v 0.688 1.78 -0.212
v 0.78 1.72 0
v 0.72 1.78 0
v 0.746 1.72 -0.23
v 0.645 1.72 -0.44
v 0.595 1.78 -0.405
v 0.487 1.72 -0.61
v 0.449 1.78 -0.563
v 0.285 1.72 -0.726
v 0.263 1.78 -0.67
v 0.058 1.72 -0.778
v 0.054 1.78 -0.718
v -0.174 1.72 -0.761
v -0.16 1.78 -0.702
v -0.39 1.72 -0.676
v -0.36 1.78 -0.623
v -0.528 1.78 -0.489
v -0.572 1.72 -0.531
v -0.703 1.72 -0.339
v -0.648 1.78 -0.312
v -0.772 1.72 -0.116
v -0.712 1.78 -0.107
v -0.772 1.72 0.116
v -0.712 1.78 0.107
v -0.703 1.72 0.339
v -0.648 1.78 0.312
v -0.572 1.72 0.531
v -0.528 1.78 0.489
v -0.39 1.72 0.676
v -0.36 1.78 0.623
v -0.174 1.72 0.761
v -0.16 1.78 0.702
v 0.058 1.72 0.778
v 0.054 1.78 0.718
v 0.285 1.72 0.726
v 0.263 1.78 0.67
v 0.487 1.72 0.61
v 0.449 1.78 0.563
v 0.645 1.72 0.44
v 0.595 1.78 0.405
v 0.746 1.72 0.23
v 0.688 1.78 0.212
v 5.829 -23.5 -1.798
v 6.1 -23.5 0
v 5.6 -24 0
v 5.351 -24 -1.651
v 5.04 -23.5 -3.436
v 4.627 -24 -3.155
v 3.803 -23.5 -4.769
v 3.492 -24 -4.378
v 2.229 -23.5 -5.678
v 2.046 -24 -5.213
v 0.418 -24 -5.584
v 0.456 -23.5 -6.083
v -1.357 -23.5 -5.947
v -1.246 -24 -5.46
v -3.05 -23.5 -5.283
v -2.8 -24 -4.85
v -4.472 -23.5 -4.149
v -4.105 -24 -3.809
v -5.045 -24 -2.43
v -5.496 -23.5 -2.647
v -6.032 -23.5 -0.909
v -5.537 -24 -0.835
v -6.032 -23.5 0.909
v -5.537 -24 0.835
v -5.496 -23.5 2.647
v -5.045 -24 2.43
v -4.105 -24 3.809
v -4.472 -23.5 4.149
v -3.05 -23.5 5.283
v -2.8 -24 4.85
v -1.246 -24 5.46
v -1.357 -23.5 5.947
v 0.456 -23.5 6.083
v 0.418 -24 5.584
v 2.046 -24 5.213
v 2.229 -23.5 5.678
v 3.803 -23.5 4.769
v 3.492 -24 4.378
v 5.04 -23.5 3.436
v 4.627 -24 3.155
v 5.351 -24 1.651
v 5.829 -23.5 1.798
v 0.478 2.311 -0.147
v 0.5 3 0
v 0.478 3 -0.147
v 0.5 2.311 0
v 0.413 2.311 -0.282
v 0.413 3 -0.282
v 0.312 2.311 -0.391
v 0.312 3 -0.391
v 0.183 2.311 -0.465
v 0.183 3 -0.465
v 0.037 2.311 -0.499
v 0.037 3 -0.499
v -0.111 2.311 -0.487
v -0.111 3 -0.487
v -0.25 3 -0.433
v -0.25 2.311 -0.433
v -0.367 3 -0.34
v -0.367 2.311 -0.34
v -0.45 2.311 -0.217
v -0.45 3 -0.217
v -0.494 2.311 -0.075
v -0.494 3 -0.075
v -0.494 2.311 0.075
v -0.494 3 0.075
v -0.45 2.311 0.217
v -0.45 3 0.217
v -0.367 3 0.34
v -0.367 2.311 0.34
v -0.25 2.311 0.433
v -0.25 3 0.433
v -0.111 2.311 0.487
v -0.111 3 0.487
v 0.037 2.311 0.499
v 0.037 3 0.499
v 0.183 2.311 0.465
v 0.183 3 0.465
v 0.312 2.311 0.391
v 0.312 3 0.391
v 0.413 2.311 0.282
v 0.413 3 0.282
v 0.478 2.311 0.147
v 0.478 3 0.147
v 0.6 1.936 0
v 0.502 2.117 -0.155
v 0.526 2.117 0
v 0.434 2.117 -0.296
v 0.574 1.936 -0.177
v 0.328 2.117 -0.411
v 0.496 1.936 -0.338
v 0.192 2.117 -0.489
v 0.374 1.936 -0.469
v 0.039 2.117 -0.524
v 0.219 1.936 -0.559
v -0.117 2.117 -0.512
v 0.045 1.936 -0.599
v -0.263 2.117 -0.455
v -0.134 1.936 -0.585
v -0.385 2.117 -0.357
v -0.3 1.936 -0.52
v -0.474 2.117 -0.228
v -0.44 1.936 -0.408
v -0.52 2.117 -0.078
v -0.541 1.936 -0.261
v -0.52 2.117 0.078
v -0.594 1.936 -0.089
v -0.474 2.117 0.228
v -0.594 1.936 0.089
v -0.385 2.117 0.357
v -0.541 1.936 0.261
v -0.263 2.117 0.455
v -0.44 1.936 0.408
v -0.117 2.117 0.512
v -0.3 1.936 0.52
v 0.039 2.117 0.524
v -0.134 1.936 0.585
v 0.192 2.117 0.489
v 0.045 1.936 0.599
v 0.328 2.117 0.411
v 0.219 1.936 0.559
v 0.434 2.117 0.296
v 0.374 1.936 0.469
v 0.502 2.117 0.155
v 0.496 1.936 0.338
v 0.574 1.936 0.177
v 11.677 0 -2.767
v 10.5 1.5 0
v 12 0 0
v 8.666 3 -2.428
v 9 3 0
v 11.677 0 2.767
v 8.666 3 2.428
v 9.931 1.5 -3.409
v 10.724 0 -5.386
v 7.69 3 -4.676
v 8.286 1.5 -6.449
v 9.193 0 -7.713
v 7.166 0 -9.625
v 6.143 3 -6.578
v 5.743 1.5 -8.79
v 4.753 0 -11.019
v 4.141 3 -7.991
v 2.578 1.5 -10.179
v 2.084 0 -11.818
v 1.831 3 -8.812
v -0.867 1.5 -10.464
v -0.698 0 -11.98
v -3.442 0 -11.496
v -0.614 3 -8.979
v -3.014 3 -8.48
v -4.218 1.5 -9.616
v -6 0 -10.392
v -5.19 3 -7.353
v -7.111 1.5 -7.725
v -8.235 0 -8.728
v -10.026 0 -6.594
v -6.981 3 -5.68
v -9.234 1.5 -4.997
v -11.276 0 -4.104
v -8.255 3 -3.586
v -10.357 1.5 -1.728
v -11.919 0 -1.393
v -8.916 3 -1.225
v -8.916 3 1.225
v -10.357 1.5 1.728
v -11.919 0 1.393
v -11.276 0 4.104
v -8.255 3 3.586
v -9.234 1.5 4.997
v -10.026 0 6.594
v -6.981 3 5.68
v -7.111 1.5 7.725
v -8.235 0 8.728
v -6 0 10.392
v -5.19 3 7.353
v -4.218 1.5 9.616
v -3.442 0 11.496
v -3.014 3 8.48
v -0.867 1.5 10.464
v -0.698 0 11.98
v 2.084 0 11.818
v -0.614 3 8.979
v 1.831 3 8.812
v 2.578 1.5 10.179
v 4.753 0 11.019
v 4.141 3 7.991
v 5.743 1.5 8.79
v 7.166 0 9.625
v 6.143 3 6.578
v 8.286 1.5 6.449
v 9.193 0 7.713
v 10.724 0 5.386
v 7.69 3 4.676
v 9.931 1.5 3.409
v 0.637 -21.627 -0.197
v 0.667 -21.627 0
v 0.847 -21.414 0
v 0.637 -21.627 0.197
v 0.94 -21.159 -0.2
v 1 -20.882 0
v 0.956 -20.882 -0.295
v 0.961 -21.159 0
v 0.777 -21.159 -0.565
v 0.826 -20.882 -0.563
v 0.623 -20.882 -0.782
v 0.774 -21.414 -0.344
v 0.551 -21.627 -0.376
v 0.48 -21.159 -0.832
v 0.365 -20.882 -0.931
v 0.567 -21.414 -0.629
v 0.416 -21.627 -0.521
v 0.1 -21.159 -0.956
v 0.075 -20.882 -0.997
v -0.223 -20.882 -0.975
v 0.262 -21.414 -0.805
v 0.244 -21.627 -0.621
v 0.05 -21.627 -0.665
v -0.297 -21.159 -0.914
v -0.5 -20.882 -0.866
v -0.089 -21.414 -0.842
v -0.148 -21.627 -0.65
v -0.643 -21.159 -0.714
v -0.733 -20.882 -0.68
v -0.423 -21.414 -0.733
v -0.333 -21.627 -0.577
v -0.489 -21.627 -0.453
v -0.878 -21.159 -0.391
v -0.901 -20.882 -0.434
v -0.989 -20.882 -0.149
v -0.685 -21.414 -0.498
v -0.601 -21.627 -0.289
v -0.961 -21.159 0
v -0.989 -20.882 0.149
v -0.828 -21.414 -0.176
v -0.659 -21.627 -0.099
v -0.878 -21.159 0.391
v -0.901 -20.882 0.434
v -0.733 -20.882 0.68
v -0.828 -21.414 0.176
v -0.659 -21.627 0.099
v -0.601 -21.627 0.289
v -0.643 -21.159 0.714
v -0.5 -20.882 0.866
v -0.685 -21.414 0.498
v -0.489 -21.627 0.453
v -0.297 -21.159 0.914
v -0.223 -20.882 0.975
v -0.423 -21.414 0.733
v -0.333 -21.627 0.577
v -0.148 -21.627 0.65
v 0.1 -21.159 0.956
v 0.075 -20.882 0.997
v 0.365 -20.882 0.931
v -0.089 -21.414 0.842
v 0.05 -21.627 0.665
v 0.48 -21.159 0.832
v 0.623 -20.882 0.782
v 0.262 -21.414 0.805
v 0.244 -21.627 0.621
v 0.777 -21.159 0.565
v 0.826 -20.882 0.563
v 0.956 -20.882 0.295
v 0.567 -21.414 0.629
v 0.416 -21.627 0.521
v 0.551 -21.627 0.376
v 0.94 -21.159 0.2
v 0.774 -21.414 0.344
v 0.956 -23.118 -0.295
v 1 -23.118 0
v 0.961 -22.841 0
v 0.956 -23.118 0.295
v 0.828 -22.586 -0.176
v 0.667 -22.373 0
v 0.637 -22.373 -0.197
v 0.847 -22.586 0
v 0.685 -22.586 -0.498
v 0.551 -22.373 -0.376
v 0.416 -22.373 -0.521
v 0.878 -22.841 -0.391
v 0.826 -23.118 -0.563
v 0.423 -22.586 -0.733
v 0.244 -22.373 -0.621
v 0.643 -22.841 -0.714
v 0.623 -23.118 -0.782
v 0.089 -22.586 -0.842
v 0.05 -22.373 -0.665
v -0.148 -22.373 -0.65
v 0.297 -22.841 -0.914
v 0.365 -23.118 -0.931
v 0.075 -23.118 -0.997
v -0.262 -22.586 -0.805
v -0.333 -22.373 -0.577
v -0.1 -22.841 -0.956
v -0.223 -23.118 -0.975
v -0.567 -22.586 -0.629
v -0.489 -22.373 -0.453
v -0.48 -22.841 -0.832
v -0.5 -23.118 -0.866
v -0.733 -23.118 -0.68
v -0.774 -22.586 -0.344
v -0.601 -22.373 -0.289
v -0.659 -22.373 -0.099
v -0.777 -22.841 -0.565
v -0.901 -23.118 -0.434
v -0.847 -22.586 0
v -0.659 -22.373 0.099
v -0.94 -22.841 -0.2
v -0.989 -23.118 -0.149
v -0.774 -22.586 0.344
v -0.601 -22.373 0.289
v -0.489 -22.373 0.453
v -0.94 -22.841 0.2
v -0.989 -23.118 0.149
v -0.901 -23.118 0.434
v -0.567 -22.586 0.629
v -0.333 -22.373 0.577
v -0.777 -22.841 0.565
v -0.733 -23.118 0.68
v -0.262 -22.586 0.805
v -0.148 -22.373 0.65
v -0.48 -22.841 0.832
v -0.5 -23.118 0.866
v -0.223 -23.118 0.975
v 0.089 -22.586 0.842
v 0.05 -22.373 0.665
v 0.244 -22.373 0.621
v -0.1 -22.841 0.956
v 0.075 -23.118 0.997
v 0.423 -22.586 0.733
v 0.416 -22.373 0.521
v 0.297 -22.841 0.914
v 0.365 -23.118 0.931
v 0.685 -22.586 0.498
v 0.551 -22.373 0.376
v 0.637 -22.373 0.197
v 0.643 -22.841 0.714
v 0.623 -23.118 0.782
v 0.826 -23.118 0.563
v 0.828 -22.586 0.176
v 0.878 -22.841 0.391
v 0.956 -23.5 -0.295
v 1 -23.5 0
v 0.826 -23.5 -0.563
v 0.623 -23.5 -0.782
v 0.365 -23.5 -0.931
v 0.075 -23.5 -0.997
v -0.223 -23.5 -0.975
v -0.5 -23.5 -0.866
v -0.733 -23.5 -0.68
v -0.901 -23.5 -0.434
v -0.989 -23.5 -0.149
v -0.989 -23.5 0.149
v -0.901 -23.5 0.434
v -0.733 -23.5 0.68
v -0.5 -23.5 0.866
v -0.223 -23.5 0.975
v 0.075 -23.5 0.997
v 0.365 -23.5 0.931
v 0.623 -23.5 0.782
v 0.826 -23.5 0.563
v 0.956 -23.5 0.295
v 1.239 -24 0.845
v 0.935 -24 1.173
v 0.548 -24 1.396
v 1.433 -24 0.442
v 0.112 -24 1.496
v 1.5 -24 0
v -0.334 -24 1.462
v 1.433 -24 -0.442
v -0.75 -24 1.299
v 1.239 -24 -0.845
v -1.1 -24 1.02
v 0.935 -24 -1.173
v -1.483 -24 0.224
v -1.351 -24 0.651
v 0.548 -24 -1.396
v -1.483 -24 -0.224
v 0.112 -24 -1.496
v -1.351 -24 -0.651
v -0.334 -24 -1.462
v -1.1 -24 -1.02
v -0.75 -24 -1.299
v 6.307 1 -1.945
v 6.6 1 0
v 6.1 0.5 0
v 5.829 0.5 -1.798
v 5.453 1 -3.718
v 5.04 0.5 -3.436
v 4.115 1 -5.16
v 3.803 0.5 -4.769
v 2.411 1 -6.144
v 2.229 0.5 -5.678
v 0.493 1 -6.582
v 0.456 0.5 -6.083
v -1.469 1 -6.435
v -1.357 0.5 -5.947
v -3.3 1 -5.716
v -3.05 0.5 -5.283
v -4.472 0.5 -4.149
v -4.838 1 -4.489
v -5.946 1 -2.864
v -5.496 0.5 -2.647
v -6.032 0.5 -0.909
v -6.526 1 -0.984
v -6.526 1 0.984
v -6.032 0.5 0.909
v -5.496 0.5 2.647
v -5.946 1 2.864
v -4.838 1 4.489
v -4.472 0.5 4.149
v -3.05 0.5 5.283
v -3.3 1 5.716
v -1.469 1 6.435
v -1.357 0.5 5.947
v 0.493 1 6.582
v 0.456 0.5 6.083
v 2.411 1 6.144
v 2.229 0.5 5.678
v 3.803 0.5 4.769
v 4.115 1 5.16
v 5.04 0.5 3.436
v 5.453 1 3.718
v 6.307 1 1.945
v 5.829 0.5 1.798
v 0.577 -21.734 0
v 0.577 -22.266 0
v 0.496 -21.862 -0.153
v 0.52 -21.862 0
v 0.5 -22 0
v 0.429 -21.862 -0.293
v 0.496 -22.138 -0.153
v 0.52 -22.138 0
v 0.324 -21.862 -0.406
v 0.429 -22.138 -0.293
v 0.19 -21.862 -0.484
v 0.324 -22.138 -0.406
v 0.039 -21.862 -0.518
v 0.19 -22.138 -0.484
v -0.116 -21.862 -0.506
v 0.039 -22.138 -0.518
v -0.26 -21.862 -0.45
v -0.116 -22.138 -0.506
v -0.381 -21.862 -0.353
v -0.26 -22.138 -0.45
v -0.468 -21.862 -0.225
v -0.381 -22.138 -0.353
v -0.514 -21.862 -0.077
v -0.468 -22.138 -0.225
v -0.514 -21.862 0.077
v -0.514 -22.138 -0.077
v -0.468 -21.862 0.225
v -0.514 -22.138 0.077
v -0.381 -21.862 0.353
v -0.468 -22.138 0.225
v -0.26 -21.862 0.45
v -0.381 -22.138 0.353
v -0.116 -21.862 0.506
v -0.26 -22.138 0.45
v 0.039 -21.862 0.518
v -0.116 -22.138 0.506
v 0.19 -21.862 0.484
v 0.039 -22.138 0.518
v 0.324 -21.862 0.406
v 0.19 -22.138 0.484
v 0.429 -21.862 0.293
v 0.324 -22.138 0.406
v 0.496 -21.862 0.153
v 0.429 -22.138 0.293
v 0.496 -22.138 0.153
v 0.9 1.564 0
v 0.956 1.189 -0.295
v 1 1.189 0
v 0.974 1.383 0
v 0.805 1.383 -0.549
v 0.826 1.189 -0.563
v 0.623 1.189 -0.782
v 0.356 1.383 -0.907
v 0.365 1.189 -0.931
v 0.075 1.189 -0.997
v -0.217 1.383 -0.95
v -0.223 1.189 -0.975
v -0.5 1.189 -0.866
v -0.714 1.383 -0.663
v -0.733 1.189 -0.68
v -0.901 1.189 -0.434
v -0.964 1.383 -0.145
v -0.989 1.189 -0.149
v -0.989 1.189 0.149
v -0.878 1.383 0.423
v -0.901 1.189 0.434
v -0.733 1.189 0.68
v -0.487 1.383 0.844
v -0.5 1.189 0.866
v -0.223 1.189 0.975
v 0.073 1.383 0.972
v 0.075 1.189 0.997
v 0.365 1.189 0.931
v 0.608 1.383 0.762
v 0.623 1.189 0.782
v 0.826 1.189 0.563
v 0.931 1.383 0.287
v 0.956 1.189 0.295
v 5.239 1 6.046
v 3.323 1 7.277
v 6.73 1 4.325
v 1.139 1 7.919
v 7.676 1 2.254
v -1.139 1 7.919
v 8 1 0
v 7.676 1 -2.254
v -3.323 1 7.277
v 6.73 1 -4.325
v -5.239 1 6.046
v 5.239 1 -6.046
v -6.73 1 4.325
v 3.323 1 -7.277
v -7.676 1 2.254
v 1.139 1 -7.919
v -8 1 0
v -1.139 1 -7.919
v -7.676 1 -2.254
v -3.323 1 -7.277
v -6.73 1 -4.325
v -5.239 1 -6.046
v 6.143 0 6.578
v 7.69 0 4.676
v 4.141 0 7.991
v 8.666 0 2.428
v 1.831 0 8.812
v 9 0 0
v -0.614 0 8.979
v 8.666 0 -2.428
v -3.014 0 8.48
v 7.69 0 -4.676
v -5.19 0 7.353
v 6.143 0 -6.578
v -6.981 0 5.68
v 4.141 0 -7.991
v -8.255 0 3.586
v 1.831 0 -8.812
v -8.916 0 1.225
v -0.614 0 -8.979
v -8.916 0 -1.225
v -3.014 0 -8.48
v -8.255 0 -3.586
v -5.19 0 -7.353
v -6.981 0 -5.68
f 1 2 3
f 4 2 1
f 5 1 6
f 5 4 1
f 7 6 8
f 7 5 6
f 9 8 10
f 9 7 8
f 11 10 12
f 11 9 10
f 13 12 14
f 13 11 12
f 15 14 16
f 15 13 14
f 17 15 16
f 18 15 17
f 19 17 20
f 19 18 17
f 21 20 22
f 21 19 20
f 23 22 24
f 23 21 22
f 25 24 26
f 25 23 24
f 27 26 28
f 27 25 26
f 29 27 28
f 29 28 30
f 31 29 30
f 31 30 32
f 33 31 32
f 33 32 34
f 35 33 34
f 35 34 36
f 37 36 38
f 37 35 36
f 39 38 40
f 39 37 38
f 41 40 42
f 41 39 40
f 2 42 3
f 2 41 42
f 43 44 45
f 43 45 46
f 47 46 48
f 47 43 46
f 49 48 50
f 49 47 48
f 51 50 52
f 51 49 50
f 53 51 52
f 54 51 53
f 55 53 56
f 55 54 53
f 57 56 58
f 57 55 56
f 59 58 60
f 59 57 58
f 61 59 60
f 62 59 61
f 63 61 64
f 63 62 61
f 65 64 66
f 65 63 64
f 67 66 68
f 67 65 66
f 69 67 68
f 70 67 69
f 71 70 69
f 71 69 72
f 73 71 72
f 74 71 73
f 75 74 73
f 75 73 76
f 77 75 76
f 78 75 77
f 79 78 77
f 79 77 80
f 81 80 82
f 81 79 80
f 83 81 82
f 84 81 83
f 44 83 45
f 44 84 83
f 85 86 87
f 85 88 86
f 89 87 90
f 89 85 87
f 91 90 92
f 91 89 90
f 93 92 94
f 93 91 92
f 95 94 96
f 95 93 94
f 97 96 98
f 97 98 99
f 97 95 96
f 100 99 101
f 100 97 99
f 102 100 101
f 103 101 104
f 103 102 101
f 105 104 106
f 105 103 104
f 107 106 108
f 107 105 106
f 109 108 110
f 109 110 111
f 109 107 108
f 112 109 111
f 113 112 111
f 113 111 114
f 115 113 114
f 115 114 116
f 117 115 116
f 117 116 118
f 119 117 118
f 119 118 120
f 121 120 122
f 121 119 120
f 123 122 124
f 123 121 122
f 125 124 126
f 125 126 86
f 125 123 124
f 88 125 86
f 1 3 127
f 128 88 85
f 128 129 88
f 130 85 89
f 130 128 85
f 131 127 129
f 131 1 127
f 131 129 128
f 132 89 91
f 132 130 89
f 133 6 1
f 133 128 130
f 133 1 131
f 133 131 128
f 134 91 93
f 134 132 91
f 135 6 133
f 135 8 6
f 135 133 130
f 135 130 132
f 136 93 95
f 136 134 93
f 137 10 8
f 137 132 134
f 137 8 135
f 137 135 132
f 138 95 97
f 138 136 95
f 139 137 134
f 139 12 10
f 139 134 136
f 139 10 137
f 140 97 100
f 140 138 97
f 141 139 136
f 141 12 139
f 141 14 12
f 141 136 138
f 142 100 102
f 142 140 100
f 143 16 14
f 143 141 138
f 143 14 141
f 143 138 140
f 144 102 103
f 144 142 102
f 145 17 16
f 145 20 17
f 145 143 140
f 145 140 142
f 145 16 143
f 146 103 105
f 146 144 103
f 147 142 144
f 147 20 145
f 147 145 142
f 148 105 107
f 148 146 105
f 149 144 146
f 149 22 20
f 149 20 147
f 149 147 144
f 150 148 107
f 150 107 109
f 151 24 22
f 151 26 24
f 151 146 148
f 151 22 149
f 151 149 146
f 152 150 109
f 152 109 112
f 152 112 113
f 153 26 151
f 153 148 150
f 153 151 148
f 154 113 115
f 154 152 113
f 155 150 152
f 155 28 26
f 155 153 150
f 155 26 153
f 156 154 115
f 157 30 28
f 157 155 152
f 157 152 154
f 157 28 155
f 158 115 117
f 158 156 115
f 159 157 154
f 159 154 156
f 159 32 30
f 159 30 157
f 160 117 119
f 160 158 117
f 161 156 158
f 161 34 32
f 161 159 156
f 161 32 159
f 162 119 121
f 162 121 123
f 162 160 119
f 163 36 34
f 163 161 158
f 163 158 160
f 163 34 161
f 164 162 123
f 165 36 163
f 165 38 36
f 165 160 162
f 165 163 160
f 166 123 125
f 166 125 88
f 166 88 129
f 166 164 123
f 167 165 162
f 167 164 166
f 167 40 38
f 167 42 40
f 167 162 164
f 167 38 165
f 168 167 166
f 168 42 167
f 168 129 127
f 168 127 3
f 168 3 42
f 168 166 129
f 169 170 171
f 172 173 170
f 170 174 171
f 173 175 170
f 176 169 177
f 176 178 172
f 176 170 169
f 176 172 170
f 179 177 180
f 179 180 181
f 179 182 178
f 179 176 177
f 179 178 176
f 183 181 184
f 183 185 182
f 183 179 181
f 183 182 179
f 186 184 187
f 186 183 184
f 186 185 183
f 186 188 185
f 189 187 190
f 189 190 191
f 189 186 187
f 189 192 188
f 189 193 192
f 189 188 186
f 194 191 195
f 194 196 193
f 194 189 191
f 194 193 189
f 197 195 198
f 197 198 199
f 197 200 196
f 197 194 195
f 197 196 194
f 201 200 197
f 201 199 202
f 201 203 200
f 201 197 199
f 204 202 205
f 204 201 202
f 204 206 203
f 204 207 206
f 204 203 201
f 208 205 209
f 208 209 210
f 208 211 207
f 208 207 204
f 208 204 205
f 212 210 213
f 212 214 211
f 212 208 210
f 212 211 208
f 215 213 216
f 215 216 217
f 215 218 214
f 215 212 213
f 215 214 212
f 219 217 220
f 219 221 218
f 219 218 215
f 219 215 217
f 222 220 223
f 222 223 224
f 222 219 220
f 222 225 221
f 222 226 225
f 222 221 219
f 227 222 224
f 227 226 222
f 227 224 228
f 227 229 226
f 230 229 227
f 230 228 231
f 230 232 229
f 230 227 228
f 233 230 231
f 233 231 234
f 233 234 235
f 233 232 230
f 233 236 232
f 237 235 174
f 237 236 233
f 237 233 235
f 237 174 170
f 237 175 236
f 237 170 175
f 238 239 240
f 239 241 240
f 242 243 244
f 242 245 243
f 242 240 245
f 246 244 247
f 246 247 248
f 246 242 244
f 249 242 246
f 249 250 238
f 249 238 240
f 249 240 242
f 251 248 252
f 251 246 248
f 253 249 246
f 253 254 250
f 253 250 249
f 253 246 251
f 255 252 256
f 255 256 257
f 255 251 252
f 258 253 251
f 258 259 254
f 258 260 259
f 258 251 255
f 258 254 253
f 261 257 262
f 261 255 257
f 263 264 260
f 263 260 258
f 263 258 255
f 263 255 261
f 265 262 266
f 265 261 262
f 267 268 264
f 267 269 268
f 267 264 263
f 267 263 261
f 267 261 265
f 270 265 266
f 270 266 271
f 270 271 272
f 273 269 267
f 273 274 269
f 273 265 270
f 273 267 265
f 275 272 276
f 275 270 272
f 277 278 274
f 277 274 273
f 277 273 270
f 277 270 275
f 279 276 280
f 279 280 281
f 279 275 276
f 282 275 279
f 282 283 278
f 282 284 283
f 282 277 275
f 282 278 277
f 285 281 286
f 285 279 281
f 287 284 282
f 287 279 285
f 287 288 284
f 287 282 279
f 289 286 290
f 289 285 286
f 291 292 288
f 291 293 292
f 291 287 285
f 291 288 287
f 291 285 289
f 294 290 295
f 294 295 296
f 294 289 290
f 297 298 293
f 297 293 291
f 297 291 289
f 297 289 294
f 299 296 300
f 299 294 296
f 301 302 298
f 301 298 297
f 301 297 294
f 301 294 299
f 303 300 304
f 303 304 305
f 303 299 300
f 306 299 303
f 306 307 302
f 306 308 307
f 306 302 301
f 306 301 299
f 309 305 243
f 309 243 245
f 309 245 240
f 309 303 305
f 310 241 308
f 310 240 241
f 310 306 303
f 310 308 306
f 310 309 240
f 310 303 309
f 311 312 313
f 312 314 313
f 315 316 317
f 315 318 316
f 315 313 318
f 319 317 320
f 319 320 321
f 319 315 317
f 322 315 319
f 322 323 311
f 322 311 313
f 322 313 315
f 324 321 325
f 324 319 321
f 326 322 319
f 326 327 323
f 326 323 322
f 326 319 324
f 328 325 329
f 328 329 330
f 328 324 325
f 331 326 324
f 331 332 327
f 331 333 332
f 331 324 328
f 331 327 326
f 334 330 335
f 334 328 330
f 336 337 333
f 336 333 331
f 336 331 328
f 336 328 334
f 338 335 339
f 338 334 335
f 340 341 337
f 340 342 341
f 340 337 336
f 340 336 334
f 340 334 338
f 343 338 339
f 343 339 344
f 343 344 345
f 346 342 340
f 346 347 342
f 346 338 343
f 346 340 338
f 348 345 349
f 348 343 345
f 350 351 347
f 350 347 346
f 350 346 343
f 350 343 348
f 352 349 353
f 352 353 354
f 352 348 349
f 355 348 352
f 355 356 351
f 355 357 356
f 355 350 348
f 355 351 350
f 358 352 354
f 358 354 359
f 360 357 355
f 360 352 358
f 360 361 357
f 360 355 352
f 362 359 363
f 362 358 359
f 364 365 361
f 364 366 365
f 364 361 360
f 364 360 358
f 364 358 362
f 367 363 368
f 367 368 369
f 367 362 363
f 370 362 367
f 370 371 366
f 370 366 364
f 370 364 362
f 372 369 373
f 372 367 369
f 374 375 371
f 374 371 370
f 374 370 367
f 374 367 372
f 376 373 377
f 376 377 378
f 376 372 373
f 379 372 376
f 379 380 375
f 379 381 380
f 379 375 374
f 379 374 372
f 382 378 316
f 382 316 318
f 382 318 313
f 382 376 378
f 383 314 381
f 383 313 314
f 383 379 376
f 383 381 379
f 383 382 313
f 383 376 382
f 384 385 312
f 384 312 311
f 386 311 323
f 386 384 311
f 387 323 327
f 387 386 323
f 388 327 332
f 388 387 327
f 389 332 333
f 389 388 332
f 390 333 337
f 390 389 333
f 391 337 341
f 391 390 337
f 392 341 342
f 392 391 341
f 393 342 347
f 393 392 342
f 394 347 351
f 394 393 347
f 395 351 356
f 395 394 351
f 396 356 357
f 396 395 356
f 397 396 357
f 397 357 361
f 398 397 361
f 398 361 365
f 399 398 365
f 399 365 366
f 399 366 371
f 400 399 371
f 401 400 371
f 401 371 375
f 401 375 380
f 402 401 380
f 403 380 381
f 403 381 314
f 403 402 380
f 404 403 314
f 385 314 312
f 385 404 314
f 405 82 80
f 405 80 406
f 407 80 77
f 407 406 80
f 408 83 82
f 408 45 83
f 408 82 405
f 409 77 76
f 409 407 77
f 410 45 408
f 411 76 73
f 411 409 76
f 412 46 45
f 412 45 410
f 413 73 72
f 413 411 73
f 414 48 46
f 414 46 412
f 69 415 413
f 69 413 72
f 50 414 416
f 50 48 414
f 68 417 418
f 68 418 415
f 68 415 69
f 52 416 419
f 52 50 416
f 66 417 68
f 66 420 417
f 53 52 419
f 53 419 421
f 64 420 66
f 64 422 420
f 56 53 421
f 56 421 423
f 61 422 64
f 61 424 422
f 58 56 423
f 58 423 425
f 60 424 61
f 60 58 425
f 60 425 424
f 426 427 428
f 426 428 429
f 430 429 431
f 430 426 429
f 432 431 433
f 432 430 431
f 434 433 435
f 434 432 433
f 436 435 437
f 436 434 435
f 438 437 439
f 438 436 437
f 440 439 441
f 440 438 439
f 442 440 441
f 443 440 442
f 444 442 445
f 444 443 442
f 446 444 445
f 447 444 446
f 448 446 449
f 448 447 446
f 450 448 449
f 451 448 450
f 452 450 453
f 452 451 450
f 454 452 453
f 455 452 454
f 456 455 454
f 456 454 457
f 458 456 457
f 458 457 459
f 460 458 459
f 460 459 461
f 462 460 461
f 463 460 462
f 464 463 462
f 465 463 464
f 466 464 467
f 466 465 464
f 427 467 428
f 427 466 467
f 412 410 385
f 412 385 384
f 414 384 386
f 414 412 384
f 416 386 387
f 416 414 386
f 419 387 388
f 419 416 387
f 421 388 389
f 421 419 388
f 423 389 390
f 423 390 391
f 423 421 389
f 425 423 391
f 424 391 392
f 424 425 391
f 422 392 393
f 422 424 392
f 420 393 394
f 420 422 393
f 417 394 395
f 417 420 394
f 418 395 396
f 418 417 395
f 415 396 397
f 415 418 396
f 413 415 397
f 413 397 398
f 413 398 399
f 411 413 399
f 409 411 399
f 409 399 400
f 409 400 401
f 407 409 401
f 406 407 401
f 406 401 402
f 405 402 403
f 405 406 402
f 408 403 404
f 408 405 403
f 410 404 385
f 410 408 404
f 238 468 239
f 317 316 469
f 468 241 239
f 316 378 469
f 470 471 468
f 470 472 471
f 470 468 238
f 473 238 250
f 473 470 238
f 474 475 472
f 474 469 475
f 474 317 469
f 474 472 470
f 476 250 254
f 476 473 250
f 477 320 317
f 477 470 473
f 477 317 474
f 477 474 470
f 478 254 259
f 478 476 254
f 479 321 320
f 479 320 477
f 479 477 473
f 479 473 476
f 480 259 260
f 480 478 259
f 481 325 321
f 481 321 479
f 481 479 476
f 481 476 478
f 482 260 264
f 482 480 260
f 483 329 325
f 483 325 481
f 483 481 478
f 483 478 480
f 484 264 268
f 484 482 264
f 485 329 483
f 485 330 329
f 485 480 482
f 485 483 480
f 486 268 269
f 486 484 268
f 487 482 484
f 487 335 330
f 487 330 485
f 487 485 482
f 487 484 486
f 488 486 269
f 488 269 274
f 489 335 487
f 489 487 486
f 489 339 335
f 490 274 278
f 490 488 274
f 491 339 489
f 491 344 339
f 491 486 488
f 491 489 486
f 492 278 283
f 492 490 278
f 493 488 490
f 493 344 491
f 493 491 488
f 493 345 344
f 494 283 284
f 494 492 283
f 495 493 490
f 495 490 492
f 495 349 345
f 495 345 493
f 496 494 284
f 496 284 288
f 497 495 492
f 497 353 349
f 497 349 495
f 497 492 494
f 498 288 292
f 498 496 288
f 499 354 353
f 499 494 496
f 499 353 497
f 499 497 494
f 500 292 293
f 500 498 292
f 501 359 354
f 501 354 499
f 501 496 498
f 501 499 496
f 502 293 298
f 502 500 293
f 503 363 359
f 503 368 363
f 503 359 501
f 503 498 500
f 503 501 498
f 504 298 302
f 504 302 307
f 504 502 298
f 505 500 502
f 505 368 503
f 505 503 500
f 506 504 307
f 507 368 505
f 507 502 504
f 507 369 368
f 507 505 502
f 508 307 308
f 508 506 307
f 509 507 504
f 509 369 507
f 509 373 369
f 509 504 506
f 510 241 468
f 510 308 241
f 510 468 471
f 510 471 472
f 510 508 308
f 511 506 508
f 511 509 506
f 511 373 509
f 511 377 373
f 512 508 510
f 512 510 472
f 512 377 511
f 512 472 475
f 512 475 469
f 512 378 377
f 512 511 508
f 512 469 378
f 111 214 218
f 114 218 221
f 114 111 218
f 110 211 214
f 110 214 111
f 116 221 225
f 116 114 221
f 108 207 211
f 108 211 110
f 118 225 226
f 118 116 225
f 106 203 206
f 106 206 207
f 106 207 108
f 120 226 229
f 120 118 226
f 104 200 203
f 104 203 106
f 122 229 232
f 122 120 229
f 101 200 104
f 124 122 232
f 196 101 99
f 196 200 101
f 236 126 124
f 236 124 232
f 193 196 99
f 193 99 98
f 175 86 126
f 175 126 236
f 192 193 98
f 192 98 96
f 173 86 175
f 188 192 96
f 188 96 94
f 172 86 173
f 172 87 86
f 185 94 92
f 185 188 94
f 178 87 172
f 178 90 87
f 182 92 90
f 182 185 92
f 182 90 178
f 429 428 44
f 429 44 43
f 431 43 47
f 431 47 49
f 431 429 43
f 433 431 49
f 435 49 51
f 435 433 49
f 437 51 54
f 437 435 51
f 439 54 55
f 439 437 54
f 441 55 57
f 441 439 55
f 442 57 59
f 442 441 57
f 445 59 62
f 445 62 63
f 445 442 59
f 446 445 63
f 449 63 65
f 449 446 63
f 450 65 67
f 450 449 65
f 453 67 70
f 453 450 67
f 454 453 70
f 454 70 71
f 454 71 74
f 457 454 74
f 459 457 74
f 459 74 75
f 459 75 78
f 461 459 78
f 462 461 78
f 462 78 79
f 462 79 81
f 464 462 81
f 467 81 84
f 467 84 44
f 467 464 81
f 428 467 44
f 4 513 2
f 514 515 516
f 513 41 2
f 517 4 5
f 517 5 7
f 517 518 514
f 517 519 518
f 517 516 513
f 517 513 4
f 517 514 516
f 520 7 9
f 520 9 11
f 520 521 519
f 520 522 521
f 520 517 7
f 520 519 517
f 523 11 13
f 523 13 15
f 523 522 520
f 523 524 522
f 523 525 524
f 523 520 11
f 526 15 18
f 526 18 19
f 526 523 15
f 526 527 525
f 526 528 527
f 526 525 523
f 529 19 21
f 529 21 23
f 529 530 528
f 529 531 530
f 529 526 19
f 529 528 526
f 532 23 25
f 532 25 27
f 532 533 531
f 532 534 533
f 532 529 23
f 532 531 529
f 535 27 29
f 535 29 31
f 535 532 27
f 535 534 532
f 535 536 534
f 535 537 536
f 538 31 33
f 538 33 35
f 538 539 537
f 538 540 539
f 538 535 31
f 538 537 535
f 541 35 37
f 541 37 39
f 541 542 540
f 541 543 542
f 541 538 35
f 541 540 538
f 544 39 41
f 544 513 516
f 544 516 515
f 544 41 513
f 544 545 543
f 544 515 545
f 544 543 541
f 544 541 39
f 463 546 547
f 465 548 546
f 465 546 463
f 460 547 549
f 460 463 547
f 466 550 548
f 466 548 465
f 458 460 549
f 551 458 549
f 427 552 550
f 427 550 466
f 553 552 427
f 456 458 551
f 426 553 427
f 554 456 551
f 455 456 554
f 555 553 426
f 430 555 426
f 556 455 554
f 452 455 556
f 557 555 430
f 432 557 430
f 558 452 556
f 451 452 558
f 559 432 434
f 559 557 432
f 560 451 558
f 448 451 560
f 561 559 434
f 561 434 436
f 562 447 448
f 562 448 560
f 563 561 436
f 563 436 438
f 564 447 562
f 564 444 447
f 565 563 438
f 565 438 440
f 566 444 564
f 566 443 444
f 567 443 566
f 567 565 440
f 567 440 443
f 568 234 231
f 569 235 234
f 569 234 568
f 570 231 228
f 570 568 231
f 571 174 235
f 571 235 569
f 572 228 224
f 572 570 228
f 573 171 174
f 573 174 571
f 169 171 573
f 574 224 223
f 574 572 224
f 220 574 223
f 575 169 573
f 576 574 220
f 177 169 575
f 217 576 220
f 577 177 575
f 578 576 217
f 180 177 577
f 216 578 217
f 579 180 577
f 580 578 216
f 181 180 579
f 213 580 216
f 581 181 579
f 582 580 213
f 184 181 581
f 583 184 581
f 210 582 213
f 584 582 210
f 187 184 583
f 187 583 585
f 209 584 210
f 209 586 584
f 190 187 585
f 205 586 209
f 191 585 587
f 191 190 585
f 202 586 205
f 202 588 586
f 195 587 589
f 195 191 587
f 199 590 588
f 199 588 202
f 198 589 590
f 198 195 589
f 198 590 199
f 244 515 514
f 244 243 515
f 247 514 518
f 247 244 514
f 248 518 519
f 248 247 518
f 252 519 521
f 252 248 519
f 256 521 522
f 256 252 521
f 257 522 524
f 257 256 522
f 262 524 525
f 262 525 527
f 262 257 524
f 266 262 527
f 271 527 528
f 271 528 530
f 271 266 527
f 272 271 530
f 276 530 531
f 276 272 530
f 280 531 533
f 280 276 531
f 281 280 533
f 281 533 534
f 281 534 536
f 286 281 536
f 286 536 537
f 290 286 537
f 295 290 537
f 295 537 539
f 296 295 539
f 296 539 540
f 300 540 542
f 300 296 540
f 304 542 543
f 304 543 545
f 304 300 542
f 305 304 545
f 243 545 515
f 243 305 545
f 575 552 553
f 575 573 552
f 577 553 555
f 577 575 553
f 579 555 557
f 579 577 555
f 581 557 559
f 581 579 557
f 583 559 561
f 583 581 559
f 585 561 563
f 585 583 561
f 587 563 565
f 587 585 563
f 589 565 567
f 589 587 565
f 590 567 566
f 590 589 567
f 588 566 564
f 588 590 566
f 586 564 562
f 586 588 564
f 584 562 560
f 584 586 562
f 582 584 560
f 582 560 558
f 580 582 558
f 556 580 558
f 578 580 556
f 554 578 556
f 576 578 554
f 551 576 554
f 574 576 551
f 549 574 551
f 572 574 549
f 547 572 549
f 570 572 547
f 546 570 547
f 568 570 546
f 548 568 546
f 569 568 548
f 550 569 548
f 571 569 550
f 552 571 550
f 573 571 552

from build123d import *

# Parameters (mm, degrees)
CHAMFER2_SIZE = 0.5


with BuildPart() as part:
    # Sketch2 → Revolve1 (revolve)
    with BuildSketch(Plane.XY):
        with BuildLine():
            Line((12, 0), (9, 3))
            Line((9, 3), (1, 3))
            Line((1, 3), (0.5, 3))
            Line((0.5, 3), (0.5, 2.310660172))
            ThreePointArc((0.5, 2.310660172), (0.557090351, 2.023647598), (0.719669914, 1.780330086))
            Line((0.719669914, 1.780330086), (0.780330086, 1.719669914))
            ThreePointArc((0.780330086, 1.719669914), (0.942909649, 1.476352402), (1, 1.189339828))
            Line((1, 1.189339828), (1, -20.881966011))
            ThreePointArc((1, -20.881966011), (0.912870929, -21.290214302), (0.666666667, -21.627322004))
            ThreePointArc((0.666666667, -21.627322004), (0.5, -22), (0.666666667, -22.372677996))
            ThreePointArc((0.666666667, -22.372677996), (0.912870929, -22.709785698), (1, -23.118033989))
            Line((1, -23.118033989), (1, -24))
            Line((1, -24), (6.1, -24))
            Line((6.1, -24), (6.1, 1))
            Line((6.1, 1), (8, 1))
            Line((8, 1), (9, 0))
            Line((9, 0), (12, 0))
        make_face()
    revolve(axis=Axis((0, -747.512282571, 0), (0, 1, 0)))

    # Chamfer2
    chamfer2_edges = [part.edges().sort_by_distance(p)[0] for p in [
        (-1, -24, 0),
        (-6.1, -24, 0),
        (-6.1, 1, 0),
    ]]
    chamfer(chamfer2_edges, length=CHAMFER2_SIZE)


solid = part.part
